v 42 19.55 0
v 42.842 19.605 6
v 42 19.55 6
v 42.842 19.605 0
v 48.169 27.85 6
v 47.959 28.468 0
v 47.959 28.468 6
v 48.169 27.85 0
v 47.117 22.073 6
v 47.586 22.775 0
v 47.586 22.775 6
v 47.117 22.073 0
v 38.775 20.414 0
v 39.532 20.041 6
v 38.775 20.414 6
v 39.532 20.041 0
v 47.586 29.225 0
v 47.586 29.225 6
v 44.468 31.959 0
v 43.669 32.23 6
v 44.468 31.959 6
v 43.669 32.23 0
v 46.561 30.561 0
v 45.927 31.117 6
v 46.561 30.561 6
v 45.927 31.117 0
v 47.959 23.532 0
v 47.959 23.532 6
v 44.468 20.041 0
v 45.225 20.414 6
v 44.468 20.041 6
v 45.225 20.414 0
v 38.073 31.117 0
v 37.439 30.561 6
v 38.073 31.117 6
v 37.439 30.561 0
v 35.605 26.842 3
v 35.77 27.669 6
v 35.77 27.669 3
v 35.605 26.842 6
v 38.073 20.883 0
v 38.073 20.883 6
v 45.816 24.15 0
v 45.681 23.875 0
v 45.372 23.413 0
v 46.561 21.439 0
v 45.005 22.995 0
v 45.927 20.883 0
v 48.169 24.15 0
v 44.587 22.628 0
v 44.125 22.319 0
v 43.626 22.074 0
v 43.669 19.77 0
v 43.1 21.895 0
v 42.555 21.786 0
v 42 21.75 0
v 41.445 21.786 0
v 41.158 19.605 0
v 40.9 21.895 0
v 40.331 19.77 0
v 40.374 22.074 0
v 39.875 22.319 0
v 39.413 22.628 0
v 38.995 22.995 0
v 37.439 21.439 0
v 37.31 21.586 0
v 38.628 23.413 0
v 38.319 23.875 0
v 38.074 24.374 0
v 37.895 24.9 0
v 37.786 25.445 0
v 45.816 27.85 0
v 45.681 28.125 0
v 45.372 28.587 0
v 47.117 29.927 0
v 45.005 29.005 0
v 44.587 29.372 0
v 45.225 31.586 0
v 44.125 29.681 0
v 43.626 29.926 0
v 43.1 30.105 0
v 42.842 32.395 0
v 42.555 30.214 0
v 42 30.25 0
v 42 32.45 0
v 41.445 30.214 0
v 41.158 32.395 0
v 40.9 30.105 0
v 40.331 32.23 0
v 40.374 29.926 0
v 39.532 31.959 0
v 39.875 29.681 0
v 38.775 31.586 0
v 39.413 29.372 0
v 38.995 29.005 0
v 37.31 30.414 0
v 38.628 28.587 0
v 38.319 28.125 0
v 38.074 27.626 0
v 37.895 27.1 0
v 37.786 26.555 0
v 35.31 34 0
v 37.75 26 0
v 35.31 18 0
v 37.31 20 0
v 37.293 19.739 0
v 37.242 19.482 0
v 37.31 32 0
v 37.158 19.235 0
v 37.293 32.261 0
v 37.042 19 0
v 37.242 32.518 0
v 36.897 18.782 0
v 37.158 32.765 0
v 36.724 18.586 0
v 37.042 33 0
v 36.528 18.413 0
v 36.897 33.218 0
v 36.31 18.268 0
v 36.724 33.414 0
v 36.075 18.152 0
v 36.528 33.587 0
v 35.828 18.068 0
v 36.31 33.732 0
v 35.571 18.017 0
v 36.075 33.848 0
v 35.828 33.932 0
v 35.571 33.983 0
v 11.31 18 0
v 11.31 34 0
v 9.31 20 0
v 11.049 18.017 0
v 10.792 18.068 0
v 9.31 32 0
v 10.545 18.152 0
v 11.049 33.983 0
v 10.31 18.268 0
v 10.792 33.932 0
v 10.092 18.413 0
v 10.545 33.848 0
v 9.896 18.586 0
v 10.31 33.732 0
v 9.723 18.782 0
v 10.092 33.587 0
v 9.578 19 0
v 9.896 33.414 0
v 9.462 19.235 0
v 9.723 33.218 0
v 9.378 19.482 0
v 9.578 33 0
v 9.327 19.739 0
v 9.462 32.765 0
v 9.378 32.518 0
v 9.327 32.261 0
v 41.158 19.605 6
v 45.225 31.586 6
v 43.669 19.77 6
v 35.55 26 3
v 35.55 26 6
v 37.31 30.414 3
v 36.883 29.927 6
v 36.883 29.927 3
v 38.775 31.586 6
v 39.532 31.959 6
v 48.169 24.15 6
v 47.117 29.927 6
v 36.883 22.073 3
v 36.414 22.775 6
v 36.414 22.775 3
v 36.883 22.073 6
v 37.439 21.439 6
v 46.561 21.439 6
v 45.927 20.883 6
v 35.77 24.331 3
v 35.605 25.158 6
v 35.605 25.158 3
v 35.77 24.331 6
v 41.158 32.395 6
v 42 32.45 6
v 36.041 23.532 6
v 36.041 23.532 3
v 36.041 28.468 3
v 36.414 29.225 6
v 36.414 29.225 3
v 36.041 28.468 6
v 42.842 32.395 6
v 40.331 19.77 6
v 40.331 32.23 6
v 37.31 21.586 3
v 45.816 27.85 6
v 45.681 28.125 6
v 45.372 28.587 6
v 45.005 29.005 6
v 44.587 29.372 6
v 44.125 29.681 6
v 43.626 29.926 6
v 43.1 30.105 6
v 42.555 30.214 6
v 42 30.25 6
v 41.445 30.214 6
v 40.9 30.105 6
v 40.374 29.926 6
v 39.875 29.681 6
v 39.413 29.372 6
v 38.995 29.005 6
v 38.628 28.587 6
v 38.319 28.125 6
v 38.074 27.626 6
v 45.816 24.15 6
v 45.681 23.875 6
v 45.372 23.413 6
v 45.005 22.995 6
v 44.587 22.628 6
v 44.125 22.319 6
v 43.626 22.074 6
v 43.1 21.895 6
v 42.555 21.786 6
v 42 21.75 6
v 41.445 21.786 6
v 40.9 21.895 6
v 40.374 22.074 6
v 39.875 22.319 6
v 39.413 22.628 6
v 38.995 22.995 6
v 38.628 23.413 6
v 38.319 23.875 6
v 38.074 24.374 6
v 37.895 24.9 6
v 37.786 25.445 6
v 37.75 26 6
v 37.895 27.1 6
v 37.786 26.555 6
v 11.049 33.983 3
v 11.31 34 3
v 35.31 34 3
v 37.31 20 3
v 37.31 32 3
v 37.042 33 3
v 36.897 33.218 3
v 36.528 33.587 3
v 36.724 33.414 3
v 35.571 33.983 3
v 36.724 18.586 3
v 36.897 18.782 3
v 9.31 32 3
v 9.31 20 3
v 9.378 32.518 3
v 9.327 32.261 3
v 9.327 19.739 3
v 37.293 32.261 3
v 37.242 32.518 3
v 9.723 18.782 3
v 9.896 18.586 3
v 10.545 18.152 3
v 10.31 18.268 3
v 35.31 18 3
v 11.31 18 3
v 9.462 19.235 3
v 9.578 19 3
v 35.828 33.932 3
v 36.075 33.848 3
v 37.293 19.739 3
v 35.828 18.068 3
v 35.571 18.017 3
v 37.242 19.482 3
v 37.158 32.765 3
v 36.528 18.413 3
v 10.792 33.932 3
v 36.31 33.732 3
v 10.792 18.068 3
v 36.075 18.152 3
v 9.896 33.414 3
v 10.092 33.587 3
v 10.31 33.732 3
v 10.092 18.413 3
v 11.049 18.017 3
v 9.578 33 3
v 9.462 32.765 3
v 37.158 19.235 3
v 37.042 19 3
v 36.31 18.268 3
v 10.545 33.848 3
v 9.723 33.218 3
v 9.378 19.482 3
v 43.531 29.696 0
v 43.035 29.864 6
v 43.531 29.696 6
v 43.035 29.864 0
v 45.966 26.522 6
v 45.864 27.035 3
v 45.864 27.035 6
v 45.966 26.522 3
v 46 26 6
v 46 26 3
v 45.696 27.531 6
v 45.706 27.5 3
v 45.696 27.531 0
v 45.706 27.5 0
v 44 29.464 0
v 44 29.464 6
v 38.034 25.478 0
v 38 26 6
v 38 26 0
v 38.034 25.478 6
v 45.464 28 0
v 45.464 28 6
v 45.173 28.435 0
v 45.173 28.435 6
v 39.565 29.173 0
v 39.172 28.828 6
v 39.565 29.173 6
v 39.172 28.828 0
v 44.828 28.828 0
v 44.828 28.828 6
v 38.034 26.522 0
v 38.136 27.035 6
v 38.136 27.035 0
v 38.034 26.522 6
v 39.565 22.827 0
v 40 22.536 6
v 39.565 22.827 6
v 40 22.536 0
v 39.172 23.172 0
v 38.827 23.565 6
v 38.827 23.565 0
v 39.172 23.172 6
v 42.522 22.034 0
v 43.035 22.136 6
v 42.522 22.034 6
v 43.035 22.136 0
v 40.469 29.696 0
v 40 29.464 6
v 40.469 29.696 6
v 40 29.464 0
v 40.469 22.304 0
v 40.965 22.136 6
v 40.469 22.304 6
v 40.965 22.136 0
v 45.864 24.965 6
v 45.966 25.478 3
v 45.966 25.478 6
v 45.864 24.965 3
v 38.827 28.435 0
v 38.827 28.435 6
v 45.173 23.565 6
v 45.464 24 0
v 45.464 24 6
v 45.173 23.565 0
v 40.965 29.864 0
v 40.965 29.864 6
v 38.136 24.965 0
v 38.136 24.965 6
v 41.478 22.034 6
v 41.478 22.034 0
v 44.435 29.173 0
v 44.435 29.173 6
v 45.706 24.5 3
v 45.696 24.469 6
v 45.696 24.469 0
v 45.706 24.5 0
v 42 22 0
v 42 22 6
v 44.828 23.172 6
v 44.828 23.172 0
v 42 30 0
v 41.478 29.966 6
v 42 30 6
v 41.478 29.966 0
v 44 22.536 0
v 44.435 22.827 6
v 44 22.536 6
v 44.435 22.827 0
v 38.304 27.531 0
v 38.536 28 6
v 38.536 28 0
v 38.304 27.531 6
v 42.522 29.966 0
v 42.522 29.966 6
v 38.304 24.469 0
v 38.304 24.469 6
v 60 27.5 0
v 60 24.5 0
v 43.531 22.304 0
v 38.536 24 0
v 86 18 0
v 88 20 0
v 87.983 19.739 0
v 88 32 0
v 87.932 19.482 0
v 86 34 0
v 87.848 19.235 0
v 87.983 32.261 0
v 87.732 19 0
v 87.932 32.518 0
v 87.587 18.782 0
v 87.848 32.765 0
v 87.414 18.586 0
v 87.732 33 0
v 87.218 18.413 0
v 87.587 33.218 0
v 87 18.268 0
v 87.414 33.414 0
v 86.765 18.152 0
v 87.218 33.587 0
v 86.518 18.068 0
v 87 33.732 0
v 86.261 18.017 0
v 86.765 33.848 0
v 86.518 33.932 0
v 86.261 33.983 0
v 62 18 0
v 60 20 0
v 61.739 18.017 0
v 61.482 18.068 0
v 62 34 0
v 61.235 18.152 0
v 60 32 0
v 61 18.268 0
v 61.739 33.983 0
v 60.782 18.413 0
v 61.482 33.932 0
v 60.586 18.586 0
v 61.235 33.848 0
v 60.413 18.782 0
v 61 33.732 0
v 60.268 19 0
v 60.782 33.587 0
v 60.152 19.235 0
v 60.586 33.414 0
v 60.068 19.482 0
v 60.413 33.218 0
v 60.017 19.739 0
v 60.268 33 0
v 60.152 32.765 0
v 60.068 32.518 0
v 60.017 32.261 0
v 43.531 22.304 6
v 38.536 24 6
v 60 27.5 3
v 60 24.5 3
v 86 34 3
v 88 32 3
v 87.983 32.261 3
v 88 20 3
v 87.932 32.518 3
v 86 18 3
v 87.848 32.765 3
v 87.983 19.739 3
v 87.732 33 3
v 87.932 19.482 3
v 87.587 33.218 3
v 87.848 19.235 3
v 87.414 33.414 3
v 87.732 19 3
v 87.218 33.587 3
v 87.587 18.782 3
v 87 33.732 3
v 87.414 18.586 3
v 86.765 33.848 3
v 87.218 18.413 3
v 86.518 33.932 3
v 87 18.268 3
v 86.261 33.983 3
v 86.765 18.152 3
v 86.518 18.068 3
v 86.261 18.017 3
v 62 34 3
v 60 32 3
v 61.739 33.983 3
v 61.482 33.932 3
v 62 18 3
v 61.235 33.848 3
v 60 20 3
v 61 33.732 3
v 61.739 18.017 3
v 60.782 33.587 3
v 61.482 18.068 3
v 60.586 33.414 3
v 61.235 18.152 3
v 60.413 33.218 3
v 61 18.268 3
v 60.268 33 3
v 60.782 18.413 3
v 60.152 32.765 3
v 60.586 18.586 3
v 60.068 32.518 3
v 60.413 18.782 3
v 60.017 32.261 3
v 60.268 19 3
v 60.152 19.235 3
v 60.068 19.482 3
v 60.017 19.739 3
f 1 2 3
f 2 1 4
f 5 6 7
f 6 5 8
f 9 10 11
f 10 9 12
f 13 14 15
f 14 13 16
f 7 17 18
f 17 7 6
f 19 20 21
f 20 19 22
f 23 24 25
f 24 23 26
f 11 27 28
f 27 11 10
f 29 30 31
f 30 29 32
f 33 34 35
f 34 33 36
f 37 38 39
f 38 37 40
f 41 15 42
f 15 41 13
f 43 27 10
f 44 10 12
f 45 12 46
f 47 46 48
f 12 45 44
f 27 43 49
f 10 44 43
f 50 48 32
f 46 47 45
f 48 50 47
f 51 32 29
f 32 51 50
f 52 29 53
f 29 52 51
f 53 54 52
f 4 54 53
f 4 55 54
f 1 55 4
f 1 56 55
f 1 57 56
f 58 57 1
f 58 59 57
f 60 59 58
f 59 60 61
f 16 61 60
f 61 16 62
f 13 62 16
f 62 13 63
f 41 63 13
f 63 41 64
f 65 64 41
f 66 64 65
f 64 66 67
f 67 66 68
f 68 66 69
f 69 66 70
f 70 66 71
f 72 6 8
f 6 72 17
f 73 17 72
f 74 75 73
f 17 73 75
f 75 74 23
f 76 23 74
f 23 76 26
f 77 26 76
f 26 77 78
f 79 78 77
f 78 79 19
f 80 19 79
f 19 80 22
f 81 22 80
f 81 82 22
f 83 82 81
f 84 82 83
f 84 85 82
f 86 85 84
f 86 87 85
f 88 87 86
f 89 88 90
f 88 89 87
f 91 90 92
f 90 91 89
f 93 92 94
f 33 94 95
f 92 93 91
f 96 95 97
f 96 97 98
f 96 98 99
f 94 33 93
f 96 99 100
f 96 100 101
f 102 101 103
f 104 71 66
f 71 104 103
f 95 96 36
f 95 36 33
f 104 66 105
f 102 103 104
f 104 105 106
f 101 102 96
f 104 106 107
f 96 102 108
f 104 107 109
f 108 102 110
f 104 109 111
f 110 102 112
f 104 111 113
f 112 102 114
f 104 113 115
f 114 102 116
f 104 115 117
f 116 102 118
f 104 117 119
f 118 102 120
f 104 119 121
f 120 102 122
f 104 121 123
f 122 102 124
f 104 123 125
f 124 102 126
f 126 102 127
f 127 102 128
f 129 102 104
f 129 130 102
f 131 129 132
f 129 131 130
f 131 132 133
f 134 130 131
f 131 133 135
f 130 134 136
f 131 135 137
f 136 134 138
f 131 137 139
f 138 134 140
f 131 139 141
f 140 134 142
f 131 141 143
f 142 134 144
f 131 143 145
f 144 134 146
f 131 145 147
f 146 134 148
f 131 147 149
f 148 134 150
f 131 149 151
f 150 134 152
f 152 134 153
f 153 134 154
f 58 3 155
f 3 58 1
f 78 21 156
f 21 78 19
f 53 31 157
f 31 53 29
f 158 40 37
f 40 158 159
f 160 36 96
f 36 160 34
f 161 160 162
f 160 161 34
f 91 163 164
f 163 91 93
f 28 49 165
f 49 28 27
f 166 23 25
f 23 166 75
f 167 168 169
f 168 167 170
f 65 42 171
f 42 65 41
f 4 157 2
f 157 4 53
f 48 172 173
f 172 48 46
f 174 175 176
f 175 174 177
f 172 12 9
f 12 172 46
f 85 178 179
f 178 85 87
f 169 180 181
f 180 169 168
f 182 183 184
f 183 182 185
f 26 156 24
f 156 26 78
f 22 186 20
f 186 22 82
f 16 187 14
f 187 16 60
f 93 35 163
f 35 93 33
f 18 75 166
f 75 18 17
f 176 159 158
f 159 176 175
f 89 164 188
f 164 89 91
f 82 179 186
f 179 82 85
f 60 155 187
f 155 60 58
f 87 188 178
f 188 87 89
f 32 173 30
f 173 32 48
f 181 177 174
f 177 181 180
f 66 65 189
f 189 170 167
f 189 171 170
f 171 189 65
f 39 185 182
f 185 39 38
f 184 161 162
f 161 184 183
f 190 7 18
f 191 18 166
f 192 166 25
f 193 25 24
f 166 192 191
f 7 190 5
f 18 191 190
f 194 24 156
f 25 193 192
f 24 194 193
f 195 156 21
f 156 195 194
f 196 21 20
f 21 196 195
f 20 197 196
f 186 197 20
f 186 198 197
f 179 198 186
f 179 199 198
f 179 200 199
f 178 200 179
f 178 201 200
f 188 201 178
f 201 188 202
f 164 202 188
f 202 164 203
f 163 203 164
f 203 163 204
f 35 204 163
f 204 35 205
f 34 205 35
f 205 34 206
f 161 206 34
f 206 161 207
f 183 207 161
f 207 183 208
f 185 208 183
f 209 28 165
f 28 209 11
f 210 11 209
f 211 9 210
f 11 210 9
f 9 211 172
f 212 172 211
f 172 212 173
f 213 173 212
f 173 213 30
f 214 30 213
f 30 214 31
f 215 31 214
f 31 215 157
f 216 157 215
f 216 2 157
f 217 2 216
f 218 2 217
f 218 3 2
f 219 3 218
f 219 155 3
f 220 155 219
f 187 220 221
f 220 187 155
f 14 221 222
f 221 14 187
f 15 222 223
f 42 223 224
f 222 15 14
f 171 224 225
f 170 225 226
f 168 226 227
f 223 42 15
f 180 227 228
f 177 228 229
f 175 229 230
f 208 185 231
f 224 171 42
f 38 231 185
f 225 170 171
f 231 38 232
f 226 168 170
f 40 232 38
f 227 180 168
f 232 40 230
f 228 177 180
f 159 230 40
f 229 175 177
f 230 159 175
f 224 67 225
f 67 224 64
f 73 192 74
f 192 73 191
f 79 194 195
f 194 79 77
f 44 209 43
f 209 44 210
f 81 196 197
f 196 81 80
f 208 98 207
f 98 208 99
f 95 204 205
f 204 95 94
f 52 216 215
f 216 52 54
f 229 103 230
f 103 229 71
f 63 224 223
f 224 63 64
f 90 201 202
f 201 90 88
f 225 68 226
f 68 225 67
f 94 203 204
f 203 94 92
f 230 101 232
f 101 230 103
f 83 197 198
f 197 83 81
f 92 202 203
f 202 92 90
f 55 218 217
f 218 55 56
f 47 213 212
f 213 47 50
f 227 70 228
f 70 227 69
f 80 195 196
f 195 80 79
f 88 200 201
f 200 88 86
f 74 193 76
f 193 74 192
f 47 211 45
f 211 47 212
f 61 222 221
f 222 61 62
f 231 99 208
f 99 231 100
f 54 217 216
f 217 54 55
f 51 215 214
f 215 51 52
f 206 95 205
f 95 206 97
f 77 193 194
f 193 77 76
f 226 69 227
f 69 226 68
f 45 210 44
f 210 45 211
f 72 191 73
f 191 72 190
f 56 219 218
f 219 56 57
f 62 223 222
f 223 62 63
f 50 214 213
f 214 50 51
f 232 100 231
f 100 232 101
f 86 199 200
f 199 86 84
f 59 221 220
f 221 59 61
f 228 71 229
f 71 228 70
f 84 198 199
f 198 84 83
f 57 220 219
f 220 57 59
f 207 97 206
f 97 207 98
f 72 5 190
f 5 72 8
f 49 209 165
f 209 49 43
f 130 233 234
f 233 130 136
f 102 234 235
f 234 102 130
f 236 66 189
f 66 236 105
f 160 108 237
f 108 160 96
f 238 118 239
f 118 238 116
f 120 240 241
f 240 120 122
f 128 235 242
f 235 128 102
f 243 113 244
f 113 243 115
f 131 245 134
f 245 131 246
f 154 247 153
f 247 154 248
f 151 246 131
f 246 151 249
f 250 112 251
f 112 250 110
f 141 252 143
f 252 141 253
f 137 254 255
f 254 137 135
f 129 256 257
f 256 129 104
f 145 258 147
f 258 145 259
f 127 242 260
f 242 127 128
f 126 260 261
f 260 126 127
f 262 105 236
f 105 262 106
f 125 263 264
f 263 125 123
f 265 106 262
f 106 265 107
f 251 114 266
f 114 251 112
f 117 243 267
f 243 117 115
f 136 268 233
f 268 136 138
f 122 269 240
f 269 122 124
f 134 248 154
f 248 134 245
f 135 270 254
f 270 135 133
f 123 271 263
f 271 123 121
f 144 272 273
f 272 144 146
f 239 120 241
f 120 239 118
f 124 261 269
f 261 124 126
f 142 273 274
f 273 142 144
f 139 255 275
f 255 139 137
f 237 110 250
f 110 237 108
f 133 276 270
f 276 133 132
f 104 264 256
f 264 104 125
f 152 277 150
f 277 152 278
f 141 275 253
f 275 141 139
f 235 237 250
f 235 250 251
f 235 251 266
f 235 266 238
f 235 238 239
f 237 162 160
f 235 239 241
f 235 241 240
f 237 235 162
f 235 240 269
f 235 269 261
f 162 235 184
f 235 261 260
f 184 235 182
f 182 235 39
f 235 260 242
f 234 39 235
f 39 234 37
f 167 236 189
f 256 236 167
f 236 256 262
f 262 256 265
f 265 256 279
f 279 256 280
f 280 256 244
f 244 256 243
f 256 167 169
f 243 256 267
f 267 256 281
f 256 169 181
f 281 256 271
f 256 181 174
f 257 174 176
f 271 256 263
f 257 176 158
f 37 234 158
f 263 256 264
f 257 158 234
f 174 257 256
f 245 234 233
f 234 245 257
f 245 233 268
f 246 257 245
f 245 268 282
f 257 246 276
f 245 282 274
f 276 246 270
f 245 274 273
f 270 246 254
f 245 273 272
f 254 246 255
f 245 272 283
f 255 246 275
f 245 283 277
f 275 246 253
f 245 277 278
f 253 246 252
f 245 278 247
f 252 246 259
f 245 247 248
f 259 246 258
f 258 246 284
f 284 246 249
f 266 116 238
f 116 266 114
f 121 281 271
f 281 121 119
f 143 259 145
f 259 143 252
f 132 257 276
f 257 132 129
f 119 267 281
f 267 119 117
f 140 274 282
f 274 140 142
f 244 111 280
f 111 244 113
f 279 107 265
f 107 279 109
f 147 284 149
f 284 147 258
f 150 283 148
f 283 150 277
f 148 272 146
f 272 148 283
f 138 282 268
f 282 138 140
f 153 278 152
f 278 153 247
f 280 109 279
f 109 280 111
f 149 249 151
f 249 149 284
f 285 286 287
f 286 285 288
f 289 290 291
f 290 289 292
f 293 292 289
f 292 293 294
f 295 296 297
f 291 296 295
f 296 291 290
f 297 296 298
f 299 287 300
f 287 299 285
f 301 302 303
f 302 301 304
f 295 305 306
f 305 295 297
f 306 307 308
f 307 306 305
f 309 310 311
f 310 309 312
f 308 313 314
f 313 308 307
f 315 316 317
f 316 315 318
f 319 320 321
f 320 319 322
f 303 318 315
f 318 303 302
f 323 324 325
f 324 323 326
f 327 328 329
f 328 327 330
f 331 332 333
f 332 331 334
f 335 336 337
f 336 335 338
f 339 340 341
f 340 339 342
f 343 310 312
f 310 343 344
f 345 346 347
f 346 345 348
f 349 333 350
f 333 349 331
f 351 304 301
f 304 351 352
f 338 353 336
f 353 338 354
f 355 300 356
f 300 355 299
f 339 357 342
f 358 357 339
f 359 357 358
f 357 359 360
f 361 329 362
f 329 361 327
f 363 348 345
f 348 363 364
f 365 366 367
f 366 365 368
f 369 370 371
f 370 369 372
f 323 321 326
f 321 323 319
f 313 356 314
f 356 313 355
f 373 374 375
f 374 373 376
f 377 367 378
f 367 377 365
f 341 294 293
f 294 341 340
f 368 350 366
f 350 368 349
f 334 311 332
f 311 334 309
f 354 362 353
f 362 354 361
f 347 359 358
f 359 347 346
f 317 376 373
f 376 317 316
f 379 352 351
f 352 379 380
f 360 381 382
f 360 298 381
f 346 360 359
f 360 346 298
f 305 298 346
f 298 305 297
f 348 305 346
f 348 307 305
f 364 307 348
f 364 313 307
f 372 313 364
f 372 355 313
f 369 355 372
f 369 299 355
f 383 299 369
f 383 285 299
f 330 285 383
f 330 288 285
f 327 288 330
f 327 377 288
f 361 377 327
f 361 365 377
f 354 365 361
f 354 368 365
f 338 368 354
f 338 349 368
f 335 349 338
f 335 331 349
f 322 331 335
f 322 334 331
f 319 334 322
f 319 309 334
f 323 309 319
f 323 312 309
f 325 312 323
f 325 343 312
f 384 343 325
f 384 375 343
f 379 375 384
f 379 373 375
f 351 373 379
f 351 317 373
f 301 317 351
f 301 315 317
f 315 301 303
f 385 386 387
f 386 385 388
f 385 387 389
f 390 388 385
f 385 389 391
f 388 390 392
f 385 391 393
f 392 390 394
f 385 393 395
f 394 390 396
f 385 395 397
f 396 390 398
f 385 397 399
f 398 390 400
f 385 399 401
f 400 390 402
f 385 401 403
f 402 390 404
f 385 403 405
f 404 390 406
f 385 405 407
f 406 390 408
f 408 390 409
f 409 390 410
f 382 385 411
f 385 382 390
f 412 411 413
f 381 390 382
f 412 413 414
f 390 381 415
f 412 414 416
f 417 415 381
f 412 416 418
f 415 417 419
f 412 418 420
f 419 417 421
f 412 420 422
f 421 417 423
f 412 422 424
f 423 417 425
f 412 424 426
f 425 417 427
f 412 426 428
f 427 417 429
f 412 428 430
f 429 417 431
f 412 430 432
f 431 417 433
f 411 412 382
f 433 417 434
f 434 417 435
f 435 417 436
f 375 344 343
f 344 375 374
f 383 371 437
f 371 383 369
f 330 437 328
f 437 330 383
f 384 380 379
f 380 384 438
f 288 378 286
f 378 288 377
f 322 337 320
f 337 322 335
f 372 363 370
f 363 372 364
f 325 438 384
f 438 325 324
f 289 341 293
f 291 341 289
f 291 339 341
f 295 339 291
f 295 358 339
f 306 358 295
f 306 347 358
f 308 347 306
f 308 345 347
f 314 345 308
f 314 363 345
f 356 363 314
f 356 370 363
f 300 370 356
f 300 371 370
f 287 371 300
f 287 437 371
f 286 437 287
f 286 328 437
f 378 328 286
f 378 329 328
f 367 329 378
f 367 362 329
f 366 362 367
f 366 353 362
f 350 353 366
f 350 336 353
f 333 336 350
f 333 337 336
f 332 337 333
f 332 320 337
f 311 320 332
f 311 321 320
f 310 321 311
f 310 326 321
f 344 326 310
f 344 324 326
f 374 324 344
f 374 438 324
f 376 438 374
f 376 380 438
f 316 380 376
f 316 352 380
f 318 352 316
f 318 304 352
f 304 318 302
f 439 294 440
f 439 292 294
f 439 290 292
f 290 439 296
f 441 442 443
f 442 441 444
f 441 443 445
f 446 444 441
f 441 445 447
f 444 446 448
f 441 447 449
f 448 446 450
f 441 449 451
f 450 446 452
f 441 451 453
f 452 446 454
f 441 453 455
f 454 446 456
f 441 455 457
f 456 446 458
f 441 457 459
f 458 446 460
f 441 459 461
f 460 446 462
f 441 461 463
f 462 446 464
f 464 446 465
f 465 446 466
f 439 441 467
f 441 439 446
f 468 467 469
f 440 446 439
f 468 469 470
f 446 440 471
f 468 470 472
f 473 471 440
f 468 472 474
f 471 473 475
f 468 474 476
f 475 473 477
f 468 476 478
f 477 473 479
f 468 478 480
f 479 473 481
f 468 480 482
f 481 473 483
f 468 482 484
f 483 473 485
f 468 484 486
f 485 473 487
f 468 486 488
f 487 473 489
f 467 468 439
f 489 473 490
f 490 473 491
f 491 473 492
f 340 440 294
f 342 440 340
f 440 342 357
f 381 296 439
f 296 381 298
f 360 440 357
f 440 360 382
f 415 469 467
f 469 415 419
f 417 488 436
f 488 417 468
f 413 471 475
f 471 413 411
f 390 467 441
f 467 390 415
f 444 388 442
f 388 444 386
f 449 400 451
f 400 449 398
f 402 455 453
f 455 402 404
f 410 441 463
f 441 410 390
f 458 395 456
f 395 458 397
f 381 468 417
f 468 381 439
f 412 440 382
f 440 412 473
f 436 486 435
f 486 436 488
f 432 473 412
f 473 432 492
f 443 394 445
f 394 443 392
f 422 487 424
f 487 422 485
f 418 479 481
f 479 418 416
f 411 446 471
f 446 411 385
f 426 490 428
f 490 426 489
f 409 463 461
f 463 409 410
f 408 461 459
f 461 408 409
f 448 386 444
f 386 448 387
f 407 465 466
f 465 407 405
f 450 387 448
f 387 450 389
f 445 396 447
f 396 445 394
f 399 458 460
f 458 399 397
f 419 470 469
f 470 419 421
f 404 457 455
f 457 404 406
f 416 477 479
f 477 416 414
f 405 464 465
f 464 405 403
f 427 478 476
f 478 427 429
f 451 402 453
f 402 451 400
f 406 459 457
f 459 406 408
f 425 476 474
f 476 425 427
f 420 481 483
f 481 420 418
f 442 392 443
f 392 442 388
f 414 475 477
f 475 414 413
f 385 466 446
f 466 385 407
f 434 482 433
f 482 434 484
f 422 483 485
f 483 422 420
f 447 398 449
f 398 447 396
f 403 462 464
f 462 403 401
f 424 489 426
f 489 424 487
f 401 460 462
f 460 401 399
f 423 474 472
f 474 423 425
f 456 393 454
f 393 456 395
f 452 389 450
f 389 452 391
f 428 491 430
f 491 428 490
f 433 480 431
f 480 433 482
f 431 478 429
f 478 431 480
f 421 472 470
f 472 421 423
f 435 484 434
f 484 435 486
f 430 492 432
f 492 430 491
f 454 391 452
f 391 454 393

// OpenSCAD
/*
Sample 006: Print-in-Place-Flachdrehgelenk — 0,25 mm
Generated from the FDM Mechanical Sample Library.
Units: millimetres.

Override examples:
  openscad -o custom.stl -D 'view="plate"' -D 'render_fn=64' model.scad
  openscad -o preview.png -D 'view="assembly"' model.scad
*/
use <../../../library/fdm_mechanisms.scad>

render_fn = is_undef(render_fn) ? 48 : render_fn;
view = is_undef(view) ? "plate" : view;
$fn = render_fn;

sample_pip_pivot(
    view=view,
    clearance=0.25,
    core_d=8
);
